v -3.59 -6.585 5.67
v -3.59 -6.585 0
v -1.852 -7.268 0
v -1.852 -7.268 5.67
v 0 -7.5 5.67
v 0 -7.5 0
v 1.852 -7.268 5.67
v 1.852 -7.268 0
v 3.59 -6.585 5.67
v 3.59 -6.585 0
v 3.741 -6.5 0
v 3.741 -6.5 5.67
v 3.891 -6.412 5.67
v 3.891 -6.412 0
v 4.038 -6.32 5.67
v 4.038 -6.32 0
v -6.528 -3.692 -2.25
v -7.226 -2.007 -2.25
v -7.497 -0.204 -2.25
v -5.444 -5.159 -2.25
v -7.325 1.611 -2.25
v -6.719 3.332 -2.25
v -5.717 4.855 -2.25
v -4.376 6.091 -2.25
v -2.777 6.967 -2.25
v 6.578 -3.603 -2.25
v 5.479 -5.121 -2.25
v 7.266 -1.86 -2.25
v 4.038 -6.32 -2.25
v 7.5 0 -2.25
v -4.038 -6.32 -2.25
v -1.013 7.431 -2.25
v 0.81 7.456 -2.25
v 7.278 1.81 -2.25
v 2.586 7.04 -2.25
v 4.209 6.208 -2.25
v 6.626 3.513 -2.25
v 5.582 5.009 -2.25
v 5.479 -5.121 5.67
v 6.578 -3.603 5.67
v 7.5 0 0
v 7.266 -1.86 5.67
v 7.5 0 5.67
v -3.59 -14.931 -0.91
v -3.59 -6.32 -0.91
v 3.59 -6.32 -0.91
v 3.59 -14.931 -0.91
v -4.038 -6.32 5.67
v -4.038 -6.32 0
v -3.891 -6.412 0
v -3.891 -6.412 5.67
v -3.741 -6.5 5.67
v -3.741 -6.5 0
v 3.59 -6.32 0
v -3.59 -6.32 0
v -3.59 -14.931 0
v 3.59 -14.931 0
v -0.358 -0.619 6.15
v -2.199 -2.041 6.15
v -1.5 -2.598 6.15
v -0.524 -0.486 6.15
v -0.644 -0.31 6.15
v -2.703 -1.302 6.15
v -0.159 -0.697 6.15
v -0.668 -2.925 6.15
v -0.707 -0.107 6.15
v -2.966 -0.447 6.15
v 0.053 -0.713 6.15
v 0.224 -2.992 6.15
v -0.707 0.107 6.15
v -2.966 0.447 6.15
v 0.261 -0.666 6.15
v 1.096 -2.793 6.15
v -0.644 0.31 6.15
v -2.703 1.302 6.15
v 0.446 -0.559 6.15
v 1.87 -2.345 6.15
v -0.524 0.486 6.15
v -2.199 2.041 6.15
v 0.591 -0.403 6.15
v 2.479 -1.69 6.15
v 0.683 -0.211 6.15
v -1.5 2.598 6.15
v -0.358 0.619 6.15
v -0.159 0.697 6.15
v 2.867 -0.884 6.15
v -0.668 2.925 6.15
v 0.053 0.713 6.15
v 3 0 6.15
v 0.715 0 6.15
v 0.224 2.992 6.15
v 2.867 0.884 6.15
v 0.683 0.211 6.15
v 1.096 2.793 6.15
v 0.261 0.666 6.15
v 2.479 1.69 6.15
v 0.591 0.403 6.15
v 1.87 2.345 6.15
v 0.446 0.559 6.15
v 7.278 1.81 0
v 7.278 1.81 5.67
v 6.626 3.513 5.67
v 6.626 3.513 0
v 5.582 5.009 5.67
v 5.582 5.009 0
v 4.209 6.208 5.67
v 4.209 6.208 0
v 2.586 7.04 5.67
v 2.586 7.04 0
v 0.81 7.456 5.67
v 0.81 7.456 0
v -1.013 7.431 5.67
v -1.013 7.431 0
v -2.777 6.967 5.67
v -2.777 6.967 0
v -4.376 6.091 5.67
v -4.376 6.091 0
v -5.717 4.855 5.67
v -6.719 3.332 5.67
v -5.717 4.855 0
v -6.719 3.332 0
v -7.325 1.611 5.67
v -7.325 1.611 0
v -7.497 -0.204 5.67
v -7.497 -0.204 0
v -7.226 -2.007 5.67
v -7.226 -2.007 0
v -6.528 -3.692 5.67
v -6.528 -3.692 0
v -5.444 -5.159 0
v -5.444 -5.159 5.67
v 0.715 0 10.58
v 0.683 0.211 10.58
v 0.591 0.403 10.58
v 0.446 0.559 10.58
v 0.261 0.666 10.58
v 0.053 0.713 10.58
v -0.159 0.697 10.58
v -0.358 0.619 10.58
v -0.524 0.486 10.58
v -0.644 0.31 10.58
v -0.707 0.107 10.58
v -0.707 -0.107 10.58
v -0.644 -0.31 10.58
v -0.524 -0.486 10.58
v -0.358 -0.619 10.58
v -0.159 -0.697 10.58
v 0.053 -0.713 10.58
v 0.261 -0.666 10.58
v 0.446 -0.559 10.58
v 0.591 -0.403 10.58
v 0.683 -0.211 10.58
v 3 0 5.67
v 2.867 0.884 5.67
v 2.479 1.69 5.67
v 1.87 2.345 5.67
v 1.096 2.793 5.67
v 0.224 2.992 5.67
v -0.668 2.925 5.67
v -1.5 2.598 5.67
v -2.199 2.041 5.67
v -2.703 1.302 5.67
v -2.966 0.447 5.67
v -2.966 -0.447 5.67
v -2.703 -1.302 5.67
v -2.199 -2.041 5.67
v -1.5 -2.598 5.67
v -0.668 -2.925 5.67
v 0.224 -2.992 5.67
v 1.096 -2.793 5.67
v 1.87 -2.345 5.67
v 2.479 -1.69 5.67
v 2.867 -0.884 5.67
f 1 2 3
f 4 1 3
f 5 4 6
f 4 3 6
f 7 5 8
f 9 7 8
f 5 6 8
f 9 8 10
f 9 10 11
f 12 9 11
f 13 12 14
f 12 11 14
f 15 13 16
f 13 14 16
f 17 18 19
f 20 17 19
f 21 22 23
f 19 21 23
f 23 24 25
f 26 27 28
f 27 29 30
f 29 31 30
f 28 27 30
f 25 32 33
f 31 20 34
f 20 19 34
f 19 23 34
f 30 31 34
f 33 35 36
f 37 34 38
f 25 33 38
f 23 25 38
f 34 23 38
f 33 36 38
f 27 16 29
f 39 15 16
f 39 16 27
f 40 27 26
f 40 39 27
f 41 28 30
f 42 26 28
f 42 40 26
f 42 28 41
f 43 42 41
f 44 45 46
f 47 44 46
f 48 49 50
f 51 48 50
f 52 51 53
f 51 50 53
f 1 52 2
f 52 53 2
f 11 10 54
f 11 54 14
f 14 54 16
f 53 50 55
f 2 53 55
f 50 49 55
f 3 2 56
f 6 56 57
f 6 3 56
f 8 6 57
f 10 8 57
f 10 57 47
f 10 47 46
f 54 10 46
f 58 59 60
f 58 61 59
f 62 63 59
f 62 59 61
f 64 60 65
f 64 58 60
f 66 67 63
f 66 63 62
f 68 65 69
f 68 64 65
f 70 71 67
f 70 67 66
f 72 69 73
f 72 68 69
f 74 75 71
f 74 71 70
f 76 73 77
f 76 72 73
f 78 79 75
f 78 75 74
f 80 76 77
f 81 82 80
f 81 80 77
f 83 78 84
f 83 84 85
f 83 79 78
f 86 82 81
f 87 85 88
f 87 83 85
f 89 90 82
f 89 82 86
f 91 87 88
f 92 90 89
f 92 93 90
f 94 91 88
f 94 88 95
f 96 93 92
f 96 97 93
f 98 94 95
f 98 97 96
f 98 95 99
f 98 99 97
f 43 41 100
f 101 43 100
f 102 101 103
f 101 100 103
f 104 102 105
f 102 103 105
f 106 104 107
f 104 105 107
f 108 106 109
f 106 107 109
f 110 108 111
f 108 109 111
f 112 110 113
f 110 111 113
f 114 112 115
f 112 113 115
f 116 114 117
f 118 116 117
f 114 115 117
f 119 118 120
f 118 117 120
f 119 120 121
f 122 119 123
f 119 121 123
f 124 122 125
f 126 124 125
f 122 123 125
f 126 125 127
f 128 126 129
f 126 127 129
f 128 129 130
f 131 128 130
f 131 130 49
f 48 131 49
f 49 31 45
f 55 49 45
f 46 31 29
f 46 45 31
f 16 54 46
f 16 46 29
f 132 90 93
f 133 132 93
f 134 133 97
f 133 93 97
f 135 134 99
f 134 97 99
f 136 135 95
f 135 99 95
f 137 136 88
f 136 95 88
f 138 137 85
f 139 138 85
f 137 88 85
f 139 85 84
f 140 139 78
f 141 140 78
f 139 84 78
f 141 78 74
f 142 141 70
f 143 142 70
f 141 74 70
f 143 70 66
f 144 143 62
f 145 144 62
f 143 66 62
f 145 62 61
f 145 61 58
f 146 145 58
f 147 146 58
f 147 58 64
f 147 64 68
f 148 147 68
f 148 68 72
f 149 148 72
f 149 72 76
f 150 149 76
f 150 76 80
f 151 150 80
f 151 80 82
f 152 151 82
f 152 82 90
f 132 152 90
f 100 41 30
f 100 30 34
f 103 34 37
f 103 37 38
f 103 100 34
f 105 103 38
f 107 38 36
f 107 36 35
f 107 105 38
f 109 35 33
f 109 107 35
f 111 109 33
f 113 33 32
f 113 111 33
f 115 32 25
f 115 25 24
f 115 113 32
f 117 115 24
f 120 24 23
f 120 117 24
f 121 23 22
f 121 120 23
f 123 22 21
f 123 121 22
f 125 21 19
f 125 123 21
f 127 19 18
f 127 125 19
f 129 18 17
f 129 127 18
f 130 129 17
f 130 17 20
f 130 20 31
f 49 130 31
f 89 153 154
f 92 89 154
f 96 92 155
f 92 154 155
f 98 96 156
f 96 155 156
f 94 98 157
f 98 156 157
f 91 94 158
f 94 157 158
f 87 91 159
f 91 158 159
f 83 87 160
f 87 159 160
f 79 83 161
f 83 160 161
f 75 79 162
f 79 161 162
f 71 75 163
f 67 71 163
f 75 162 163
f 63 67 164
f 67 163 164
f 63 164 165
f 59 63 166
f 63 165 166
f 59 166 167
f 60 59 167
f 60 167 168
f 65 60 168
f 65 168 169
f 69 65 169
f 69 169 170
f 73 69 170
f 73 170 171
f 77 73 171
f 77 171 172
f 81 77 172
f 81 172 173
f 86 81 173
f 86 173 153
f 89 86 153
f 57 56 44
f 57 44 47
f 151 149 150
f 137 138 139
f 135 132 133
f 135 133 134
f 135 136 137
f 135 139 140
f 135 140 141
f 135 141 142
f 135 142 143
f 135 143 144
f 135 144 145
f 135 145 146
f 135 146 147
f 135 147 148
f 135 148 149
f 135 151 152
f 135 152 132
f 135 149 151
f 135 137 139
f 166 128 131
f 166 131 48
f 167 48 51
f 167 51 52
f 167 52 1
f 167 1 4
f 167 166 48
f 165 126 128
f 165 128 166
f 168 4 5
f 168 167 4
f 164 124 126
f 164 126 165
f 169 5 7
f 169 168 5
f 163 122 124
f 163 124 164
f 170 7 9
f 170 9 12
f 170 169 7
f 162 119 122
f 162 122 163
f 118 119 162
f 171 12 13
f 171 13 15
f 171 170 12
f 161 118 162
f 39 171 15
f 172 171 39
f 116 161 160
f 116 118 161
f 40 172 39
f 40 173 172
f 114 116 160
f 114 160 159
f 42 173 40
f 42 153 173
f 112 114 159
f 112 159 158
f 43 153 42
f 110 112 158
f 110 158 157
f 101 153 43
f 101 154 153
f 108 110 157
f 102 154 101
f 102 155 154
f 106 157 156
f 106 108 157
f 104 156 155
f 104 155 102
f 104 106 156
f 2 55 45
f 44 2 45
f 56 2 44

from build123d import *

# Parameters (mm, degrees)
F0_R     = 3
F0_R_2   = 0.715
F1_DEPTH = 5.67
F2_DEPTH = 6.15
F3_DEPTH = 10.58
F4_DEPTH = 2.25
F5_DEPTH = 0.91


with BuildPart() as f1:
    # F0 (on Top) → F1 (new body)
    with BuildSketch(Plane.XY):
        with BuildLine():
            ThreePointArc((4.038266955, -6.32), (6.5778796798, -3.6029847236), (7.5, 0))
            ThreePointArc((7.5, 0), (-3.6029847236, 6.5778796798), (-4.038266955, -6.32))
            Line((-4.038266955, -6.32), (-3.59, -6.32))
            Line((-3.59, -6.32), (3.59, -6.32))
            Line((3.59, -6.32), (4.038266955, -6.32))
        make_face()
        Circle(F0_R, mode=Mode.SUBTRACT)
        Circle(F0_R)
        Circle(F0_R_2, mode=Mode.SUBTRACT)
        with BuildLine():
            Line((-3.59, -6.32), (-3.59, -6.5849753227))
            ThreePointArc((-3.59, -6.5849753227), (0, -7.5), (3.59, -6.5849753227))
            Line((3.59, -6.5849753227), (3.59, -6.32))
            Line((3.59, -6.32), (-3.59, -6.32))
        make_face()
        Circle(F0_R_2)
        with BuildLine():
            ThreePointArc((3.59, -6.5849753227), (3.8164338282, -6.4563792357), (4.038266955, -6.32))
            Line((4.038266955, -6.32), (3.59, -6.32))
            Line((3.59, -6.32), (3.59, -6.5849753227))
        make_face()
        with BuildLine():
            Line((-3.59, -6.32), (-4.038266955, -6.32))
            ThreePointArc((-4.038266955, -6.32), (-3.8164338282, -6.4563792357), (-3.59, -6.5849753227))
            Line((-3.59, -6.5849753227), (-3.59, -6.32))
        make_face()
    extrude(amount=F1_DEPTH)

    # F0 (on Top) → F2 (join)
    with BuildSketch(Plane.XY):
        Circle(F0_R)
        Circle(F0_R_2, mode=Mode.SUBTRACT)
        Circle(F0_R_2)
    extrude(amount=F2_DEPTH)

    # F0 (on Top) → F3 (join)
    with BuildSketch(Plane.XY):
        Circle(F0_R_2)
    extrude(amount=F3_DEPTH)

    # F0 (on Top) → F4 (join)
    with BuildSketch(Plane.XY):
        with BuildLine():
            ThreePointArc((4.038266955, -6.32), (6.5778796798, -3.6029847236), (7.5, 0))
            ThreePointArc((7.5, 0), (-3.6029847236, 6.5778796798), (-4.038266955, -6.32))
            Line((-4.038266955, -6.32), (-3.59, -6.32))
            Line((-3.59, -6.32), (3.59, -6.32))
            Line((3.59, -6.32), (4.038266955, -6.32))
        make_face()
        Circle(F0_R, mode=Mode.SUBTRACT)
        Circle(F0_R)
        Circle(F0_R_2, mode=Mode.SUBTRACT)
        Circle(F0_R_2)
    extrude(amount=-F4_DEPTH)

    # F0 (on Top) → F5 (join)
    with BuildSketch(Plane.XY):
        with BuildLine():
            Line((-3.59, -6.32), (-3.59, -6.5849753227))
            ThreePointArc((-3.59, -6.5849753227), (0, -7.5), (3.59, -6.5849753227))
            Line((3.59, -6.5849753227), (3.59, -6.32))
            Line((3.59, -6.32), (-3.59, -6.32))
        make_face()
        with BuildLine():
            ThreePointArc((3.59, -6.5849753227), (0, -7.5), (-3.59, -6.5849753227))
            Line((-3.59, -6.5849753227), (-3.59, -14.931))
            Line((-3.59, -14.931), (3.59, -14.931))
            Line((3.59, -14.931), (3.59, -6.5849753227))
        make_face()
    extrude(amount=-F5_DEPTH)


solid = f1.part
